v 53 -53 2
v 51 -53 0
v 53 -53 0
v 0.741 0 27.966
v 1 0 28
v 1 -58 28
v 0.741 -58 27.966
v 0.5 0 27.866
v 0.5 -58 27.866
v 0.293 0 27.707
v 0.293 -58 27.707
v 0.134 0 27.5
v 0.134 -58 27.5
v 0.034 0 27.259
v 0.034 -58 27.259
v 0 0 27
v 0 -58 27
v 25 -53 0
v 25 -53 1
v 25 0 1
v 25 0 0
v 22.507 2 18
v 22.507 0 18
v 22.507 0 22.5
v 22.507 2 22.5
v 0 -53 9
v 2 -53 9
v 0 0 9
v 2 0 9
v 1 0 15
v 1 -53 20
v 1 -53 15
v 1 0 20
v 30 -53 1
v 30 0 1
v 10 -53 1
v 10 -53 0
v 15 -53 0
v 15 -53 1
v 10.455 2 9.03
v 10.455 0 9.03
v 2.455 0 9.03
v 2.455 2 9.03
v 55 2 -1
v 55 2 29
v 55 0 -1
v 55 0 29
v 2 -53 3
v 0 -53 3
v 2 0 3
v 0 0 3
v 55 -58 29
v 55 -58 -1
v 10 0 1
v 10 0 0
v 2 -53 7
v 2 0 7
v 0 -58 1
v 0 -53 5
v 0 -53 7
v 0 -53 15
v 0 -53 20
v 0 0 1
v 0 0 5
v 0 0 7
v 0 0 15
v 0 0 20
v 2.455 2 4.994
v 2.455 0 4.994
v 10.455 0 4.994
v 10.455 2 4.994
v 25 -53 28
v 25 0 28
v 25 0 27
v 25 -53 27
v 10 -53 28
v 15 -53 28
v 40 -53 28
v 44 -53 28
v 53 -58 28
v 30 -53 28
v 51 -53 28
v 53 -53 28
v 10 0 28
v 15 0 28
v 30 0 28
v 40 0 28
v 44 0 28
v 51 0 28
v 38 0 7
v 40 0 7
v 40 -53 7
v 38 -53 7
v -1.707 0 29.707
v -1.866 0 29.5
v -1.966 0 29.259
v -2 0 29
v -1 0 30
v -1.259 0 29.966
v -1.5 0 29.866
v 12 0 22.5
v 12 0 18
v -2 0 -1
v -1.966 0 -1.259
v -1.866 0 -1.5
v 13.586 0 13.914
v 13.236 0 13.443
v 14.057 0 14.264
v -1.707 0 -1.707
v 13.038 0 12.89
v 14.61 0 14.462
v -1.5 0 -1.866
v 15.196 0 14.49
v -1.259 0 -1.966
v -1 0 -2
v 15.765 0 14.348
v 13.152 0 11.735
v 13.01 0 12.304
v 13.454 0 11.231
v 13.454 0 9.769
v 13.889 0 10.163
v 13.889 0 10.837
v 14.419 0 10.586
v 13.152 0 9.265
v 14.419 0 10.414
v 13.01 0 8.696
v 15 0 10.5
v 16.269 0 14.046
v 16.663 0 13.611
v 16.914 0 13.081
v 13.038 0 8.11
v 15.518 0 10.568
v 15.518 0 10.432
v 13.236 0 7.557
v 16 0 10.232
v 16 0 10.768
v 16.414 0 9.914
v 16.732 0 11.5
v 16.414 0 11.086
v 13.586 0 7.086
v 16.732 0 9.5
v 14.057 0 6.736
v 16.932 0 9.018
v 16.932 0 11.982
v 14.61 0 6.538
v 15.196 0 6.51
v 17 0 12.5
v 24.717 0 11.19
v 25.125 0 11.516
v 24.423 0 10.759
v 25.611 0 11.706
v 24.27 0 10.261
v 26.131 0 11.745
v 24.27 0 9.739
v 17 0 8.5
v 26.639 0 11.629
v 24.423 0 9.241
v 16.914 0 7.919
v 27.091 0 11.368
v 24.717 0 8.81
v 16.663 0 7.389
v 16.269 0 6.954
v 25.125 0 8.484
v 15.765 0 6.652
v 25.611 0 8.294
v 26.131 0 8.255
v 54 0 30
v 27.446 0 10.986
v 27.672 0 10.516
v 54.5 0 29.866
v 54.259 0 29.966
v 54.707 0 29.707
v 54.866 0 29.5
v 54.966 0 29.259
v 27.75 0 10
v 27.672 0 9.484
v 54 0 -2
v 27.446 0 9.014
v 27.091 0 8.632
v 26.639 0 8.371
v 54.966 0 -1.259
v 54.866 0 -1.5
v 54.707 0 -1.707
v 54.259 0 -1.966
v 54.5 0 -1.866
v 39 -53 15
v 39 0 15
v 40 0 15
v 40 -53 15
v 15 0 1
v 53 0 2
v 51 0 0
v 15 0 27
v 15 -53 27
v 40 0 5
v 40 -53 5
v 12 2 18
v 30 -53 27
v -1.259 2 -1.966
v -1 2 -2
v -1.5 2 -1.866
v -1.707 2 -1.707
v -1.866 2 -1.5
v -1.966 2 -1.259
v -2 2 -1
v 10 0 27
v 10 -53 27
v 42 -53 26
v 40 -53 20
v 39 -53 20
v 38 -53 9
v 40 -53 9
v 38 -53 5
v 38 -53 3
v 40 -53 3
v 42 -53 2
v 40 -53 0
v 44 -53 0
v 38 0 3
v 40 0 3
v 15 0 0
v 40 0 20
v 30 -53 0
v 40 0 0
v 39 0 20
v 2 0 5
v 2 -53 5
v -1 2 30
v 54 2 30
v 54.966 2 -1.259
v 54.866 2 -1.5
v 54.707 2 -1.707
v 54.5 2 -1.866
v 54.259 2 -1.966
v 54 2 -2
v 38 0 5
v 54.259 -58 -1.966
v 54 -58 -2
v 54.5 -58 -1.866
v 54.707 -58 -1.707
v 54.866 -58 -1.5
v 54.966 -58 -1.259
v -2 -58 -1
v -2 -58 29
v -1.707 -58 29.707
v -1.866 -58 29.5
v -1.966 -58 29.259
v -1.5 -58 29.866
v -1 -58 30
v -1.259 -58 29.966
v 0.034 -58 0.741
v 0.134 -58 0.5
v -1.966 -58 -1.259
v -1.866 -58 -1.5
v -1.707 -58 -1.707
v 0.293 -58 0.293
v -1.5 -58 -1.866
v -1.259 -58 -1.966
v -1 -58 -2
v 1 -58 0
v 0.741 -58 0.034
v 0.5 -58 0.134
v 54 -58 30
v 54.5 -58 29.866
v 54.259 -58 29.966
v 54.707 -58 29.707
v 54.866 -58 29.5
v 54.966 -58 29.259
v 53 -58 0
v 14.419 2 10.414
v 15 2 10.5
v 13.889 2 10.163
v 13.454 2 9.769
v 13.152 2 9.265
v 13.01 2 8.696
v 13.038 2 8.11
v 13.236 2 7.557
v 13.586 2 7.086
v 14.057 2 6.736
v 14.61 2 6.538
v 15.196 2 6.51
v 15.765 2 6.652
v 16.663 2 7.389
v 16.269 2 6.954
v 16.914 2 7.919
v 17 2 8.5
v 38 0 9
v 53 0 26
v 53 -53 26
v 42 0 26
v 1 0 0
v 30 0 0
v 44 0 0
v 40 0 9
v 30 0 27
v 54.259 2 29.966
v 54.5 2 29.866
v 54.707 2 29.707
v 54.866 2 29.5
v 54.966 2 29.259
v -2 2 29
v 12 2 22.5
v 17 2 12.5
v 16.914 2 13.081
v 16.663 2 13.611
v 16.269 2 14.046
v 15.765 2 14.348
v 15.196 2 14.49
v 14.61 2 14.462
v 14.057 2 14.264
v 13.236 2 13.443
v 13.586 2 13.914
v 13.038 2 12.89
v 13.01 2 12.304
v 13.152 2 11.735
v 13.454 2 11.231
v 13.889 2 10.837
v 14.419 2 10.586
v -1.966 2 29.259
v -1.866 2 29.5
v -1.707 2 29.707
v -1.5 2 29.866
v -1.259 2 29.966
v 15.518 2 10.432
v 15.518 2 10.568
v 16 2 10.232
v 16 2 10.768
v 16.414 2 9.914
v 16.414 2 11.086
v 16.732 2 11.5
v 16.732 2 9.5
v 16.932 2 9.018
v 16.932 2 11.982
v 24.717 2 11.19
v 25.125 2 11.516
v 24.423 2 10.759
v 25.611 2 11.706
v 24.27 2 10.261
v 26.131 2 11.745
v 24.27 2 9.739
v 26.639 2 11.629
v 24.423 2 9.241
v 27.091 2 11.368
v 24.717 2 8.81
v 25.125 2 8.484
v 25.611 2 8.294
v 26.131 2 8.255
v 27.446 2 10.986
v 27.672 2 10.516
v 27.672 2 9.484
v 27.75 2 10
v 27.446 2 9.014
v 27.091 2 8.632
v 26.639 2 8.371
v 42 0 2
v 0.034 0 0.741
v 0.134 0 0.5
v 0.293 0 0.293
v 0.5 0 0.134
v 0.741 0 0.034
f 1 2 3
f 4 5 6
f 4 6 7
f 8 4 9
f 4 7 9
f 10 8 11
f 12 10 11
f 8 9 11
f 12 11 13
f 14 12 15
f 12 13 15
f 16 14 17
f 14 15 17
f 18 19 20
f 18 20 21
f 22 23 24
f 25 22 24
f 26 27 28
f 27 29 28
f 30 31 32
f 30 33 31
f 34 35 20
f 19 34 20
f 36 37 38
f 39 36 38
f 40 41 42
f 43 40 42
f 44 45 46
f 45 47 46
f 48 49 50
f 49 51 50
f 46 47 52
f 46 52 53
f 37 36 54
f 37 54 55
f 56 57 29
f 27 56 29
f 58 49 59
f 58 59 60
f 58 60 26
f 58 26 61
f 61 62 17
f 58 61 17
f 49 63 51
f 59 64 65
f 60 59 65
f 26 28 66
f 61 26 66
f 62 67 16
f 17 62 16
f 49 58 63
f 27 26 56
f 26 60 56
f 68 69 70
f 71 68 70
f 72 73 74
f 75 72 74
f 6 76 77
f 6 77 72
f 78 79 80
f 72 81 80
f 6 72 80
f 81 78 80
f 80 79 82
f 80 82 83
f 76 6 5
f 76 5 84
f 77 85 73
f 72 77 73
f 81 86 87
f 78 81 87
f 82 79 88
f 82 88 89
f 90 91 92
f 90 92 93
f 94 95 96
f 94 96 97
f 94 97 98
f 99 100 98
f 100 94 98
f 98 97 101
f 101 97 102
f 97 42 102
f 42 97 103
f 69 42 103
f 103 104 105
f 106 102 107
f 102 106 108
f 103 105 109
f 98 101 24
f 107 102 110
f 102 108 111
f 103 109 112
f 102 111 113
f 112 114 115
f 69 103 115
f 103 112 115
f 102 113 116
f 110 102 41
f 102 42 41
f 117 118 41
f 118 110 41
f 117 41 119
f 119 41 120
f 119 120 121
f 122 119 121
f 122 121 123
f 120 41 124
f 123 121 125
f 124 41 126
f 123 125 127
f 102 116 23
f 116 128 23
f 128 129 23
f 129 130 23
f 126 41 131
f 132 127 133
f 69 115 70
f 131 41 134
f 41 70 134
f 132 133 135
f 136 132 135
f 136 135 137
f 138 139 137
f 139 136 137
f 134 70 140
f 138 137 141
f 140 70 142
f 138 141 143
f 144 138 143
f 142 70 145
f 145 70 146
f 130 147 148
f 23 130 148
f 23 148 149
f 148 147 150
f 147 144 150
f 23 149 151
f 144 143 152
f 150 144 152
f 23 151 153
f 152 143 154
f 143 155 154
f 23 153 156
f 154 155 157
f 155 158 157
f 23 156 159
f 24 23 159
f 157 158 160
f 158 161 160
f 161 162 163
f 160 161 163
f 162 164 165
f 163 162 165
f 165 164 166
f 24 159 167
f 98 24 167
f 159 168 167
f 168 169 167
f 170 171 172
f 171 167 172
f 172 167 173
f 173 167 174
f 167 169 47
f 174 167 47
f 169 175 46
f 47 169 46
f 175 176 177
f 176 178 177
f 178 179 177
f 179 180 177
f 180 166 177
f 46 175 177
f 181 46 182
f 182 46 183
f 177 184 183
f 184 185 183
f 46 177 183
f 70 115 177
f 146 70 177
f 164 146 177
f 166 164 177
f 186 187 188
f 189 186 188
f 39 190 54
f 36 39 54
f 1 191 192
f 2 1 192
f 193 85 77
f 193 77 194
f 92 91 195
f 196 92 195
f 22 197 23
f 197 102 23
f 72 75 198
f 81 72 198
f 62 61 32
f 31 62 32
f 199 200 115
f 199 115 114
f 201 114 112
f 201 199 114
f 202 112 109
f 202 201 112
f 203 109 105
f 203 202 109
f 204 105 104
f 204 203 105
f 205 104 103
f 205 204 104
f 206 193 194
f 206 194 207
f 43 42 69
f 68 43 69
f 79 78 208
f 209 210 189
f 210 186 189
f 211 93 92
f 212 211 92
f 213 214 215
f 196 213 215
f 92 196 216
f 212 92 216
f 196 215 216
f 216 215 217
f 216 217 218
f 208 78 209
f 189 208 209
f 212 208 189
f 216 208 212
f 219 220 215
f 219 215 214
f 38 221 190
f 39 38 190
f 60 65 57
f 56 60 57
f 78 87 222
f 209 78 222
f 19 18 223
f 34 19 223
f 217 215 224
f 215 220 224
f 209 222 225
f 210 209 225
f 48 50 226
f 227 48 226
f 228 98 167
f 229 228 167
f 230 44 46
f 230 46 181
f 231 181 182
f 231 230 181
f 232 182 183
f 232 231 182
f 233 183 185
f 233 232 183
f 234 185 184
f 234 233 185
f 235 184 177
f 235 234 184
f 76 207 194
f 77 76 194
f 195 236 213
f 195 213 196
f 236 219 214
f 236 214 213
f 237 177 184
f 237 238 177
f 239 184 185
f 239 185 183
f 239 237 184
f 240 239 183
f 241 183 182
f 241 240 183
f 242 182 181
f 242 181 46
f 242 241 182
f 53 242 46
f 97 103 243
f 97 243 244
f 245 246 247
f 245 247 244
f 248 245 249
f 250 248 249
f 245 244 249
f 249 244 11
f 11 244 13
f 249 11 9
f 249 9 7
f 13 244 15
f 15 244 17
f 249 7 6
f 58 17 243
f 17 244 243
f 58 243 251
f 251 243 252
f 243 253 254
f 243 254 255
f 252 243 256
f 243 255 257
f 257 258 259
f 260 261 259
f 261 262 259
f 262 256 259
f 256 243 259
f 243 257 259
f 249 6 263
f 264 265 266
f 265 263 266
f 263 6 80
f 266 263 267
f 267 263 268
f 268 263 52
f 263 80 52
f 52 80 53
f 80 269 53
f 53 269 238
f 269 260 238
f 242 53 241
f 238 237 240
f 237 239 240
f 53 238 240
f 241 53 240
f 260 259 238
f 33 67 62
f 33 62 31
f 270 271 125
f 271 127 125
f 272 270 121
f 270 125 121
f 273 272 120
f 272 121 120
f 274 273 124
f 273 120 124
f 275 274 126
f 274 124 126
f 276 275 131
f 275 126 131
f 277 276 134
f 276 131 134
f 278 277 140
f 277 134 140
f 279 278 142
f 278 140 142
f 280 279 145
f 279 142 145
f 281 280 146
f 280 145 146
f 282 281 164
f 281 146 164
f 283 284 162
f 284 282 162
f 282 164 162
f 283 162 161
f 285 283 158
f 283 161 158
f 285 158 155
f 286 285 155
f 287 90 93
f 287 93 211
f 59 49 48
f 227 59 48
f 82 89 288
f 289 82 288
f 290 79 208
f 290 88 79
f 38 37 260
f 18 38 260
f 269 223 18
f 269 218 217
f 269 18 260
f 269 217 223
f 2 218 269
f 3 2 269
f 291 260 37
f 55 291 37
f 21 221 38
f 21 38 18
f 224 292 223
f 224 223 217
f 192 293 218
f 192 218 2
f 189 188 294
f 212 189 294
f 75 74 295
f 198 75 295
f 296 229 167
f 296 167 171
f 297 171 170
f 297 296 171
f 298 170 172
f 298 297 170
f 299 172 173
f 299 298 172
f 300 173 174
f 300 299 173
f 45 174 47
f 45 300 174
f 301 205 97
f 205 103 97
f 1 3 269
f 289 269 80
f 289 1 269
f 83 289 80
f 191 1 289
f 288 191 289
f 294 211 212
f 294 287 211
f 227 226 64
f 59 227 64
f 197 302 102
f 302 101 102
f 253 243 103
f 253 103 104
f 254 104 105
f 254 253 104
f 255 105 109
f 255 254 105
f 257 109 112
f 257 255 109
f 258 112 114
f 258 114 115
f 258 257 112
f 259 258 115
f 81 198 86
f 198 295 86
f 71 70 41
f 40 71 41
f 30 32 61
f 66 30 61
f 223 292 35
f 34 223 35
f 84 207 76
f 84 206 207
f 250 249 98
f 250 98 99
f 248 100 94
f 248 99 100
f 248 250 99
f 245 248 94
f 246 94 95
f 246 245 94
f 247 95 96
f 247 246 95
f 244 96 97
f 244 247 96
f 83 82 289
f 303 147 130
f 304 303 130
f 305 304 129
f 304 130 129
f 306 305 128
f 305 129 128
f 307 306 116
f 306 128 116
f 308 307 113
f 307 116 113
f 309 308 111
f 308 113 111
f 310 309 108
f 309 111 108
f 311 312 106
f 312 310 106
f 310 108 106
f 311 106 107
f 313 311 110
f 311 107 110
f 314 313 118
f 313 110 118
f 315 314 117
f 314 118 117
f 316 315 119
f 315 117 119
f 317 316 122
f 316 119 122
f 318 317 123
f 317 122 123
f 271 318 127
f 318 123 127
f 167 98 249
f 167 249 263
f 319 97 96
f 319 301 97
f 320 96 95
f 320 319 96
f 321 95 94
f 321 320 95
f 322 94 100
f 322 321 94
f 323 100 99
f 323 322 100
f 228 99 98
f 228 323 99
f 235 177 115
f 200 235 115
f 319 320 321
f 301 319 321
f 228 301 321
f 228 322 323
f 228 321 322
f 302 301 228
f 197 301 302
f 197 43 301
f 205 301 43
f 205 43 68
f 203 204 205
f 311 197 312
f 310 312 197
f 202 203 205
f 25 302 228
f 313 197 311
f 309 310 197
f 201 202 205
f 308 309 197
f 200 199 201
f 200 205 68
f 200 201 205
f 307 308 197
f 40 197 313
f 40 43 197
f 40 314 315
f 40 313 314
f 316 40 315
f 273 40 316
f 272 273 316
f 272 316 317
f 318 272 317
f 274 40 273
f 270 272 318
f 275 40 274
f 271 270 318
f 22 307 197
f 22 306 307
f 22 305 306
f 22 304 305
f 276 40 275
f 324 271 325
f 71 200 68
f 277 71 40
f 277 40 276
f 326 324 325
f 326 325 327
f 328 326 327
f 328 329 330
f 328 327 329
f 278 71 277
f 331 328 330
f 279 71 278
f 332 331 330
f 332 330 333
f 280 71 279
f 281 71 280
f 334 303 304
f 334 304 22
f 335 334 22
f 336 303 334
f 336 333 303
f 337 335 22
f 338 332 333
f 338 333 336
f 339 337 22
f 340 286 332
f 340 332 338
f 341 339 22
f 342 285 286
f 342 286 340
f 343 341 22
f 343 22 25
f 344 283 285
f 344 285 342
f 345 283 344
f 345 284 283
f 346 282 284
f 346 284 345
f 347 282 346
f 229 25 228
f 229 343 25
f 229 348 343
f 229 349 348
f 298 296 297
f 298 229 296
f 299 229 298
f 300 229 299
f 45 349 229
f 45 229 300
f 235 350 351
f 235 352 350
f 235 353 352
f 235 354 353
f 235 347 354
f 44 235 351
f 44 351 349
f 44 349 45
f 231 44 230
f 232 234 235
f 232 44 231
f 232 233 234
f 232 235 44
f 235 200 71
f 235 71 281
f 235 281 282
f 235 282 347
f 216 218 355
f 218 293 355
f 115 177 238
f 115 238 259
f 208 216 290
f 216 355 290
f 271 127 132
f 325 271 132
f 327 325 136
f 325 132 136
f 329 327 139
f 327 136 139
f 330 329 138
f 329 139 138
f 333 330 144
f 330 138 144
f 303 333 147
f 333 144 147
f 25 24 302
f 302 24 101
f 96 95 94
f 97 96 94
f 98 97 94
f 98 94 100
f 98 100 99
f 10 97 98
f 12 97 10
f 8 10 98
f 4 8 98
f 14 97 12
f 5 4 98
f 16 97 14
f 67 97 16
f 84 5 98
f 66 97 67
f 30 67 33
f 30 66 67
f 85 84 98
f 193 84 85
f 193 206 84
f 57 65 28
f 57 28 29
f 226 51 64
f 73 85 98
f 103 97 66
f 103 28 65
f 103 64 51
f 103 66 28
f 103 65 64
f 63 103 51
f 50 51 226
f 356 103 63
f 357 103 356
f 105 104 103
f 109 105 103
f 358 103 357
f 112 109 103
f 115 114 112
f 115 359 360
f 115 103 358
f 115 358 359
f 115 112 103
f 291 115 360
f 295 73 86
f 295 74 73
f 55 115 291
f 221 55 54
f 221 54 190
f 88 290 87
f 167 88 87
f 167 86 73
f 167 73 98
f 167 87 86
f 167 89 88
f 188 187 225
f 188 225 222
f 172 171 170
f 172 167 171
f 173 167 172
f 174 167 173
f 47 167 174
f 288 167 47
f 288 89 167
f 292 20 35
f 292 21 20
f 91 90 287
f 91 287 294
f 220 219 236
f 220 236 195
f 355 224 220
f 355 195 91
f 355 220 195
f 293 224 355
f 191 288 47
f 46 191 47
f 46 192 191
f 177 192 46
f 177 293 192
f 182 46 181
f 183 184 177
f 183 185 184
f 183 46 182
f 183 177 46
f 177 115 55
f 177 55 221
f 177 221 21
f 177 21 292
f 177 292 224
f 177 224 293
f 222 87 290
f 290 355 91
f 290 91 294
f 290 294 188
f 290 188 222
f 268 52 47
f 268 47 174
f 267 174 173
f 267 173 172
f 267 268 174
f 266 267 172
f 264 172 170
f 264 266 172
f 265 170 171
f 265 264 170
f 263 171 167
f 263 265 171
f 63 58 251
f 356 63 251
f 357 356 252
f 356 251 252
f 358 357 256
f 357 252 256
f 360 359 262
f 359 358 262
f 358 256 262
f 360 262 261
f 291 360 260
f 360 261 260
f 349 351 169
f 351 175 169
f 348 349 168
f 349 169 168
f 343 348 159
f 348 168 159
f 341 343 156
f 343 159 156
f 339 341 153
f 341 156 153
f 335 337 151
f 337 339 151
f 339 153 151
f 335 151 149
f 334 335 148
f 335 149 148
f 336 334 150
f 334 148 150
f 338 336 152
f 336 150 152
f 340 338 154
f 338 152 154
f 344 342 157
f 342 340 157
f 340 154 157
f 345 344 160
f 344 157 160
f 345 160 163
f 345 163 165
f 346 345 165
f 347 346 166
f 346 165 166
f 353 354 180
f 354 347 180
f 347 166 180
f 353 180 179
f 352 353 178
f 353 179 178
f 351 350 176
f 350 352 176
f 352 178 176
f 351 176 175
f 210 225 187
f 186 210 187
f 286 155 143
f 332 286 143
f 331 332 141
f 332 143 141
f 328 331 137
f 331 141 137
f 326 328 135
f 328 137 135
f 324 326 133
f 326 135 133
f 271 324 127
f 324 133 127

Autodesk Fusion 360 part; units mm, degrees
sketch "Esquisse1" plane through (0, 0, 0) normal (0, 1, 0) x (1, 0, 0)
  line L0 (0, -28) -> (40, -28)
  line L1 (40, -28) -> (40, 0)
  line L2 (40, 0) -> (42, 0)
  line L3 (42, 0) -> (42, -28)
  line L4 (42, -28) -> (40, -28)
  line L5 (40, -28) -> (40, 0)
  line L6 (42, 0) -> (53, 0)
  line L7 (53, 0) -> (53, -28)
  line L8 (53, -28) -> (42, -28)
  line L9 (42, -28) -> (42, 0)
  line L10 (12, 0) -> (15, 0)
  line L11 (25, 0) -> (28, 0)
  line L12 (10, -28) -> (15, -28)
  line L13 (15, -28) -> (15, -27)
  line L14 (15, -27) -> (10, -27)
  line L15 (10, -27) -> (10, -28)
  line L16 (30, -28) -> (25, -28)
  line L17 (25, -28) -> (25, -27)
  line L18 (25, -27) -> (30, -27)
  line L19 (30, -27) -> (30, -28)
  line L20 (0, -3) -> (2, -3)
  line L21 (2, -3) -> (2, -5)
  line L22 (2, -5) -> (0, -5)
  line L23 (0, -5) -> (0, -3)
  line L24 (40, -3) -> (38, -3)
  line L25 (38, -3) -> (38, -5)
  line L26 (38, -5) -> (40, -5)
  line L27 (40, -5) -> (40, -3)
  line L28 (40, -7) -> (38, -7)
  line L29 (38, -7) -> (38, -9)
  line L30 (38, -9) -> (40, -9)
  line L31 (40, -9) -> (40, -7)
  line L32 (2.4548, -4.9937) -> (10.4548, -4.9937)
  line L33 (10.4548, -4.9937) -> (10.4548, -9.0296)
  line L34 (10.4548, -9.0296) -> (2.4548, -9.0296)
  line L35 (2.4548, -9.0296) -> (2.4548, -4.9937)
  circle A0 centre (26, -10) radius 1.75
  circle A1 centre (15, -8.5) radius 2
  circle A2 centre (15, -12.5) radius 2
  line L36 (0, 0) -> (40, 0)
  line L37 (0, 0) -> (0, -28)
  line L38 (0, -7) -> (2, -7)
  line L39 (2, -7) -> (2, -9)
  line L40 (2, -9) -> (0, -9)
  line L41 (0, -9) -> (0, -7)
  line L42 (-2, -30) -> (55, -30)
  line L43 (55, -30) -> (55, 2)
  line L44 (55, 2) -> (-2, 2)
  line L45 (-2, 2) -> (-2, -30)
  line L46 (0, 0) -> (15, 0)
  line L47 (0, -16.5) -> (0, 0)
  line L48 (12, -18) -> (22.5073, -18)
  line L49 (22.5073, -18) -> (22.5073, -22.5)
  line L50 (22.5073, -22.5) -> (12, -22.5)
  line L51 (12, -22.5) -> (12, -18)
  line L52 (0, -20) -> (1, -20)
  line L53 (1, -20) -> (1, -15)
  line L54 (1, -15) -> (0, -15)
  line L55 (0, -15) -> (0, -20)
  line L56 (40, -16) -> (40, -20)
  line L57 (44, -28) -> (42, -26)
  line L58 (51, -28) -> (53, -26)
  line L59 (53, -2) -> (51, 0)
  line L60 (44, 0) -> (42, -2)
  line L61 (10, 0) -> (15, 0)
  line L62 (15, 0) -> (15, -1)
  line L63 (15, -1) -> (10, -1)
  line L64 (10, -1) -> (10, 0)
  line L65 (25, 0) -> (30, 0)
  line L66 (30, 0) -> (30, -1)
  line L67 (30, -1) -> (25, -1)
  line L68 (25, -1) -> (25, 0)
  line L69 (40, -20) -> (39, -20)
  line L70 (39, -20) -> (39, -15)
  line L71 (39, -15) -> (40, -15)
  line L72 (40, -15) -> (40, -20)
  dimension "d42" = 28
  dimension "d43" = 32
  dimension "d44" = 40
  dimension "d45" = 2
  dimension "d46" = 11
  dimension "d47" = 57
sketch "Esquisse2" plane through (0, 0, 0) normal (0, 1, 0) x (1, 0, 0)
sketch "Esquisse3" plane through (0, 0, 0) normal (0, 1, 0) x (1, 0, 0)
  line L0 (-2, -30) -> (55, -30)
  line L1 (-2, 2) -> (-2, -30)
  dimension "d54" = 57
  dimension "d55" = 32
extrude "Extrusion11" add sketch "Esquisse1" along normal blind 2 contours L0 L1 L5 L13 L14 L15 L17 L18 L19 L20 L21 L22 L24 L25 L26 L28 L29 L30 L36 L37 L38 L39 L40 L46 L47 L52 L53 L54 L62 L63 L64 L66 L67 L68 L69 L70 L71 | L0 L12 L13 L14 L15 | L37 L47 L52 L53 L54 L55 | L0 L16 L17 L18 L19 | L37 L38 L39 L40 L41 L47 | L1 L2 L3 L4 L5 L9 L27 L31 L56 L72 | L1 L5 L56 L69 L70 L71 L72 | L3 L8 L9 L57 | L20 L21 L22 L23 L37 L47 | L3 L6 L7 L8 L9 L57 L58 L59 L60 | L3 L6 L9 L60 | L7 L8 L58 | L1 L5 L28 L29 L30 L31 | L10 L36 L46 L61 L62 L63 L64 | L6 L7 L59 | L1 L5 L24 L25 L26 L27 | L11 L36 L65 L66 L67 L68 | L42 L43 L44 L45 makes body 1
extrude "Extrusion12" add sketch "Esquisse1" against normal blind 53 separate body contours L0 L12 L13 L14 L15 | L37 L47 L52 L53 L54 L55 | L0 L16 L17 L18 L19 | L37 L38 L39 L40 L41 L47 | L1 L2 L3 L4 L5 L9 L27 L31 L56 L72 | L1 L5 L56 L69 L70 L71 L72 | L3 L8 L9 L57 | L20 L21 L22 L23 L37 L47 | L3 L6 L9 L60 | L7 L8 L58 | L1 L5 L28 L29 L30 L31 | L10 L36 L46 L61 L62 L63 L64 | L6 L7 L59 | L1 L5 L24 L25 L26 L27 | L11 L36 L65 L66 L67 L68 makes body 2 at (26.6667, -17.6667, 27) makes body 3 at (0, -17.6667, 4.3333) makes body 4 at (13.3333, -17.6667, 27) makes body 5 at (11.6667, -17.6667, 0) makes body 6 at (51.6667, -35.3333, 27.3333) makes body 7 at (42, -35.3333, 18) makes body 8 at (0, -17.6667, 7.6667) makes body 9 at (0, -17.6667, 16.6667) makes body 10 at (28.3333, -17.6667, 1) makes body 11 at (52.3333, -17.6667, 1.3333)
extrude "Extrusion13" add sketch "Esquisse1" against normal blind 58 contours L42 L43 L44 L45 bodies 2 3 4 5 6 7 8 9 10 11
fillet "Congé1" radius 1 6 edges at (-2, -29, 30) (55, -29, 30) (0, -29, 28) (0, -29, 0) (-2, -29, -2) (55, -29, -2) on bodies 2
sketch "Esquisse4" plane through (0, 0, 0) normal (0, 0, 1) x (1, 0, 0)
fillet "Congé2" radius 1 1 edges at (55, 1, -2) on bodies 1
fillet "Congé3" radius 1 1 edges at (-2, 1, -2) on bodies 1
fillet "Congé4" radius 1 1 edges at (55, 1, 30) on bodies 1
fillet "Congé5" radius 1 1 edges at (-2, 1, 30) on bodies 1
sketch "Esquisse5" plane through (0, 0, 0) normal (0, 1, 0) x (1, 0, 0)
  line L0 (-2, 2) -> (-2, -30)
  line L1 (0, 0) -> (0, -28)
  line L2 (-2, -30) -> (55, -30)
  line L3 (0, -28) -> (40, -28)
  line L4 (42, -28) -> (40, -28)
  line L5 (53, -28) -> (42, -28)
  dimension "d80" = 32
  dimension "d81" = 28
  dimension "d82" = 57
  dimension "d83" = 40
  dimension "d84" = 2
  dimension "d85" = 11
extrude "Extrusion1" [suppressed]
extrude "Extrusion2" [suppressed]
extrude "Extrusion3" [suppressed]
